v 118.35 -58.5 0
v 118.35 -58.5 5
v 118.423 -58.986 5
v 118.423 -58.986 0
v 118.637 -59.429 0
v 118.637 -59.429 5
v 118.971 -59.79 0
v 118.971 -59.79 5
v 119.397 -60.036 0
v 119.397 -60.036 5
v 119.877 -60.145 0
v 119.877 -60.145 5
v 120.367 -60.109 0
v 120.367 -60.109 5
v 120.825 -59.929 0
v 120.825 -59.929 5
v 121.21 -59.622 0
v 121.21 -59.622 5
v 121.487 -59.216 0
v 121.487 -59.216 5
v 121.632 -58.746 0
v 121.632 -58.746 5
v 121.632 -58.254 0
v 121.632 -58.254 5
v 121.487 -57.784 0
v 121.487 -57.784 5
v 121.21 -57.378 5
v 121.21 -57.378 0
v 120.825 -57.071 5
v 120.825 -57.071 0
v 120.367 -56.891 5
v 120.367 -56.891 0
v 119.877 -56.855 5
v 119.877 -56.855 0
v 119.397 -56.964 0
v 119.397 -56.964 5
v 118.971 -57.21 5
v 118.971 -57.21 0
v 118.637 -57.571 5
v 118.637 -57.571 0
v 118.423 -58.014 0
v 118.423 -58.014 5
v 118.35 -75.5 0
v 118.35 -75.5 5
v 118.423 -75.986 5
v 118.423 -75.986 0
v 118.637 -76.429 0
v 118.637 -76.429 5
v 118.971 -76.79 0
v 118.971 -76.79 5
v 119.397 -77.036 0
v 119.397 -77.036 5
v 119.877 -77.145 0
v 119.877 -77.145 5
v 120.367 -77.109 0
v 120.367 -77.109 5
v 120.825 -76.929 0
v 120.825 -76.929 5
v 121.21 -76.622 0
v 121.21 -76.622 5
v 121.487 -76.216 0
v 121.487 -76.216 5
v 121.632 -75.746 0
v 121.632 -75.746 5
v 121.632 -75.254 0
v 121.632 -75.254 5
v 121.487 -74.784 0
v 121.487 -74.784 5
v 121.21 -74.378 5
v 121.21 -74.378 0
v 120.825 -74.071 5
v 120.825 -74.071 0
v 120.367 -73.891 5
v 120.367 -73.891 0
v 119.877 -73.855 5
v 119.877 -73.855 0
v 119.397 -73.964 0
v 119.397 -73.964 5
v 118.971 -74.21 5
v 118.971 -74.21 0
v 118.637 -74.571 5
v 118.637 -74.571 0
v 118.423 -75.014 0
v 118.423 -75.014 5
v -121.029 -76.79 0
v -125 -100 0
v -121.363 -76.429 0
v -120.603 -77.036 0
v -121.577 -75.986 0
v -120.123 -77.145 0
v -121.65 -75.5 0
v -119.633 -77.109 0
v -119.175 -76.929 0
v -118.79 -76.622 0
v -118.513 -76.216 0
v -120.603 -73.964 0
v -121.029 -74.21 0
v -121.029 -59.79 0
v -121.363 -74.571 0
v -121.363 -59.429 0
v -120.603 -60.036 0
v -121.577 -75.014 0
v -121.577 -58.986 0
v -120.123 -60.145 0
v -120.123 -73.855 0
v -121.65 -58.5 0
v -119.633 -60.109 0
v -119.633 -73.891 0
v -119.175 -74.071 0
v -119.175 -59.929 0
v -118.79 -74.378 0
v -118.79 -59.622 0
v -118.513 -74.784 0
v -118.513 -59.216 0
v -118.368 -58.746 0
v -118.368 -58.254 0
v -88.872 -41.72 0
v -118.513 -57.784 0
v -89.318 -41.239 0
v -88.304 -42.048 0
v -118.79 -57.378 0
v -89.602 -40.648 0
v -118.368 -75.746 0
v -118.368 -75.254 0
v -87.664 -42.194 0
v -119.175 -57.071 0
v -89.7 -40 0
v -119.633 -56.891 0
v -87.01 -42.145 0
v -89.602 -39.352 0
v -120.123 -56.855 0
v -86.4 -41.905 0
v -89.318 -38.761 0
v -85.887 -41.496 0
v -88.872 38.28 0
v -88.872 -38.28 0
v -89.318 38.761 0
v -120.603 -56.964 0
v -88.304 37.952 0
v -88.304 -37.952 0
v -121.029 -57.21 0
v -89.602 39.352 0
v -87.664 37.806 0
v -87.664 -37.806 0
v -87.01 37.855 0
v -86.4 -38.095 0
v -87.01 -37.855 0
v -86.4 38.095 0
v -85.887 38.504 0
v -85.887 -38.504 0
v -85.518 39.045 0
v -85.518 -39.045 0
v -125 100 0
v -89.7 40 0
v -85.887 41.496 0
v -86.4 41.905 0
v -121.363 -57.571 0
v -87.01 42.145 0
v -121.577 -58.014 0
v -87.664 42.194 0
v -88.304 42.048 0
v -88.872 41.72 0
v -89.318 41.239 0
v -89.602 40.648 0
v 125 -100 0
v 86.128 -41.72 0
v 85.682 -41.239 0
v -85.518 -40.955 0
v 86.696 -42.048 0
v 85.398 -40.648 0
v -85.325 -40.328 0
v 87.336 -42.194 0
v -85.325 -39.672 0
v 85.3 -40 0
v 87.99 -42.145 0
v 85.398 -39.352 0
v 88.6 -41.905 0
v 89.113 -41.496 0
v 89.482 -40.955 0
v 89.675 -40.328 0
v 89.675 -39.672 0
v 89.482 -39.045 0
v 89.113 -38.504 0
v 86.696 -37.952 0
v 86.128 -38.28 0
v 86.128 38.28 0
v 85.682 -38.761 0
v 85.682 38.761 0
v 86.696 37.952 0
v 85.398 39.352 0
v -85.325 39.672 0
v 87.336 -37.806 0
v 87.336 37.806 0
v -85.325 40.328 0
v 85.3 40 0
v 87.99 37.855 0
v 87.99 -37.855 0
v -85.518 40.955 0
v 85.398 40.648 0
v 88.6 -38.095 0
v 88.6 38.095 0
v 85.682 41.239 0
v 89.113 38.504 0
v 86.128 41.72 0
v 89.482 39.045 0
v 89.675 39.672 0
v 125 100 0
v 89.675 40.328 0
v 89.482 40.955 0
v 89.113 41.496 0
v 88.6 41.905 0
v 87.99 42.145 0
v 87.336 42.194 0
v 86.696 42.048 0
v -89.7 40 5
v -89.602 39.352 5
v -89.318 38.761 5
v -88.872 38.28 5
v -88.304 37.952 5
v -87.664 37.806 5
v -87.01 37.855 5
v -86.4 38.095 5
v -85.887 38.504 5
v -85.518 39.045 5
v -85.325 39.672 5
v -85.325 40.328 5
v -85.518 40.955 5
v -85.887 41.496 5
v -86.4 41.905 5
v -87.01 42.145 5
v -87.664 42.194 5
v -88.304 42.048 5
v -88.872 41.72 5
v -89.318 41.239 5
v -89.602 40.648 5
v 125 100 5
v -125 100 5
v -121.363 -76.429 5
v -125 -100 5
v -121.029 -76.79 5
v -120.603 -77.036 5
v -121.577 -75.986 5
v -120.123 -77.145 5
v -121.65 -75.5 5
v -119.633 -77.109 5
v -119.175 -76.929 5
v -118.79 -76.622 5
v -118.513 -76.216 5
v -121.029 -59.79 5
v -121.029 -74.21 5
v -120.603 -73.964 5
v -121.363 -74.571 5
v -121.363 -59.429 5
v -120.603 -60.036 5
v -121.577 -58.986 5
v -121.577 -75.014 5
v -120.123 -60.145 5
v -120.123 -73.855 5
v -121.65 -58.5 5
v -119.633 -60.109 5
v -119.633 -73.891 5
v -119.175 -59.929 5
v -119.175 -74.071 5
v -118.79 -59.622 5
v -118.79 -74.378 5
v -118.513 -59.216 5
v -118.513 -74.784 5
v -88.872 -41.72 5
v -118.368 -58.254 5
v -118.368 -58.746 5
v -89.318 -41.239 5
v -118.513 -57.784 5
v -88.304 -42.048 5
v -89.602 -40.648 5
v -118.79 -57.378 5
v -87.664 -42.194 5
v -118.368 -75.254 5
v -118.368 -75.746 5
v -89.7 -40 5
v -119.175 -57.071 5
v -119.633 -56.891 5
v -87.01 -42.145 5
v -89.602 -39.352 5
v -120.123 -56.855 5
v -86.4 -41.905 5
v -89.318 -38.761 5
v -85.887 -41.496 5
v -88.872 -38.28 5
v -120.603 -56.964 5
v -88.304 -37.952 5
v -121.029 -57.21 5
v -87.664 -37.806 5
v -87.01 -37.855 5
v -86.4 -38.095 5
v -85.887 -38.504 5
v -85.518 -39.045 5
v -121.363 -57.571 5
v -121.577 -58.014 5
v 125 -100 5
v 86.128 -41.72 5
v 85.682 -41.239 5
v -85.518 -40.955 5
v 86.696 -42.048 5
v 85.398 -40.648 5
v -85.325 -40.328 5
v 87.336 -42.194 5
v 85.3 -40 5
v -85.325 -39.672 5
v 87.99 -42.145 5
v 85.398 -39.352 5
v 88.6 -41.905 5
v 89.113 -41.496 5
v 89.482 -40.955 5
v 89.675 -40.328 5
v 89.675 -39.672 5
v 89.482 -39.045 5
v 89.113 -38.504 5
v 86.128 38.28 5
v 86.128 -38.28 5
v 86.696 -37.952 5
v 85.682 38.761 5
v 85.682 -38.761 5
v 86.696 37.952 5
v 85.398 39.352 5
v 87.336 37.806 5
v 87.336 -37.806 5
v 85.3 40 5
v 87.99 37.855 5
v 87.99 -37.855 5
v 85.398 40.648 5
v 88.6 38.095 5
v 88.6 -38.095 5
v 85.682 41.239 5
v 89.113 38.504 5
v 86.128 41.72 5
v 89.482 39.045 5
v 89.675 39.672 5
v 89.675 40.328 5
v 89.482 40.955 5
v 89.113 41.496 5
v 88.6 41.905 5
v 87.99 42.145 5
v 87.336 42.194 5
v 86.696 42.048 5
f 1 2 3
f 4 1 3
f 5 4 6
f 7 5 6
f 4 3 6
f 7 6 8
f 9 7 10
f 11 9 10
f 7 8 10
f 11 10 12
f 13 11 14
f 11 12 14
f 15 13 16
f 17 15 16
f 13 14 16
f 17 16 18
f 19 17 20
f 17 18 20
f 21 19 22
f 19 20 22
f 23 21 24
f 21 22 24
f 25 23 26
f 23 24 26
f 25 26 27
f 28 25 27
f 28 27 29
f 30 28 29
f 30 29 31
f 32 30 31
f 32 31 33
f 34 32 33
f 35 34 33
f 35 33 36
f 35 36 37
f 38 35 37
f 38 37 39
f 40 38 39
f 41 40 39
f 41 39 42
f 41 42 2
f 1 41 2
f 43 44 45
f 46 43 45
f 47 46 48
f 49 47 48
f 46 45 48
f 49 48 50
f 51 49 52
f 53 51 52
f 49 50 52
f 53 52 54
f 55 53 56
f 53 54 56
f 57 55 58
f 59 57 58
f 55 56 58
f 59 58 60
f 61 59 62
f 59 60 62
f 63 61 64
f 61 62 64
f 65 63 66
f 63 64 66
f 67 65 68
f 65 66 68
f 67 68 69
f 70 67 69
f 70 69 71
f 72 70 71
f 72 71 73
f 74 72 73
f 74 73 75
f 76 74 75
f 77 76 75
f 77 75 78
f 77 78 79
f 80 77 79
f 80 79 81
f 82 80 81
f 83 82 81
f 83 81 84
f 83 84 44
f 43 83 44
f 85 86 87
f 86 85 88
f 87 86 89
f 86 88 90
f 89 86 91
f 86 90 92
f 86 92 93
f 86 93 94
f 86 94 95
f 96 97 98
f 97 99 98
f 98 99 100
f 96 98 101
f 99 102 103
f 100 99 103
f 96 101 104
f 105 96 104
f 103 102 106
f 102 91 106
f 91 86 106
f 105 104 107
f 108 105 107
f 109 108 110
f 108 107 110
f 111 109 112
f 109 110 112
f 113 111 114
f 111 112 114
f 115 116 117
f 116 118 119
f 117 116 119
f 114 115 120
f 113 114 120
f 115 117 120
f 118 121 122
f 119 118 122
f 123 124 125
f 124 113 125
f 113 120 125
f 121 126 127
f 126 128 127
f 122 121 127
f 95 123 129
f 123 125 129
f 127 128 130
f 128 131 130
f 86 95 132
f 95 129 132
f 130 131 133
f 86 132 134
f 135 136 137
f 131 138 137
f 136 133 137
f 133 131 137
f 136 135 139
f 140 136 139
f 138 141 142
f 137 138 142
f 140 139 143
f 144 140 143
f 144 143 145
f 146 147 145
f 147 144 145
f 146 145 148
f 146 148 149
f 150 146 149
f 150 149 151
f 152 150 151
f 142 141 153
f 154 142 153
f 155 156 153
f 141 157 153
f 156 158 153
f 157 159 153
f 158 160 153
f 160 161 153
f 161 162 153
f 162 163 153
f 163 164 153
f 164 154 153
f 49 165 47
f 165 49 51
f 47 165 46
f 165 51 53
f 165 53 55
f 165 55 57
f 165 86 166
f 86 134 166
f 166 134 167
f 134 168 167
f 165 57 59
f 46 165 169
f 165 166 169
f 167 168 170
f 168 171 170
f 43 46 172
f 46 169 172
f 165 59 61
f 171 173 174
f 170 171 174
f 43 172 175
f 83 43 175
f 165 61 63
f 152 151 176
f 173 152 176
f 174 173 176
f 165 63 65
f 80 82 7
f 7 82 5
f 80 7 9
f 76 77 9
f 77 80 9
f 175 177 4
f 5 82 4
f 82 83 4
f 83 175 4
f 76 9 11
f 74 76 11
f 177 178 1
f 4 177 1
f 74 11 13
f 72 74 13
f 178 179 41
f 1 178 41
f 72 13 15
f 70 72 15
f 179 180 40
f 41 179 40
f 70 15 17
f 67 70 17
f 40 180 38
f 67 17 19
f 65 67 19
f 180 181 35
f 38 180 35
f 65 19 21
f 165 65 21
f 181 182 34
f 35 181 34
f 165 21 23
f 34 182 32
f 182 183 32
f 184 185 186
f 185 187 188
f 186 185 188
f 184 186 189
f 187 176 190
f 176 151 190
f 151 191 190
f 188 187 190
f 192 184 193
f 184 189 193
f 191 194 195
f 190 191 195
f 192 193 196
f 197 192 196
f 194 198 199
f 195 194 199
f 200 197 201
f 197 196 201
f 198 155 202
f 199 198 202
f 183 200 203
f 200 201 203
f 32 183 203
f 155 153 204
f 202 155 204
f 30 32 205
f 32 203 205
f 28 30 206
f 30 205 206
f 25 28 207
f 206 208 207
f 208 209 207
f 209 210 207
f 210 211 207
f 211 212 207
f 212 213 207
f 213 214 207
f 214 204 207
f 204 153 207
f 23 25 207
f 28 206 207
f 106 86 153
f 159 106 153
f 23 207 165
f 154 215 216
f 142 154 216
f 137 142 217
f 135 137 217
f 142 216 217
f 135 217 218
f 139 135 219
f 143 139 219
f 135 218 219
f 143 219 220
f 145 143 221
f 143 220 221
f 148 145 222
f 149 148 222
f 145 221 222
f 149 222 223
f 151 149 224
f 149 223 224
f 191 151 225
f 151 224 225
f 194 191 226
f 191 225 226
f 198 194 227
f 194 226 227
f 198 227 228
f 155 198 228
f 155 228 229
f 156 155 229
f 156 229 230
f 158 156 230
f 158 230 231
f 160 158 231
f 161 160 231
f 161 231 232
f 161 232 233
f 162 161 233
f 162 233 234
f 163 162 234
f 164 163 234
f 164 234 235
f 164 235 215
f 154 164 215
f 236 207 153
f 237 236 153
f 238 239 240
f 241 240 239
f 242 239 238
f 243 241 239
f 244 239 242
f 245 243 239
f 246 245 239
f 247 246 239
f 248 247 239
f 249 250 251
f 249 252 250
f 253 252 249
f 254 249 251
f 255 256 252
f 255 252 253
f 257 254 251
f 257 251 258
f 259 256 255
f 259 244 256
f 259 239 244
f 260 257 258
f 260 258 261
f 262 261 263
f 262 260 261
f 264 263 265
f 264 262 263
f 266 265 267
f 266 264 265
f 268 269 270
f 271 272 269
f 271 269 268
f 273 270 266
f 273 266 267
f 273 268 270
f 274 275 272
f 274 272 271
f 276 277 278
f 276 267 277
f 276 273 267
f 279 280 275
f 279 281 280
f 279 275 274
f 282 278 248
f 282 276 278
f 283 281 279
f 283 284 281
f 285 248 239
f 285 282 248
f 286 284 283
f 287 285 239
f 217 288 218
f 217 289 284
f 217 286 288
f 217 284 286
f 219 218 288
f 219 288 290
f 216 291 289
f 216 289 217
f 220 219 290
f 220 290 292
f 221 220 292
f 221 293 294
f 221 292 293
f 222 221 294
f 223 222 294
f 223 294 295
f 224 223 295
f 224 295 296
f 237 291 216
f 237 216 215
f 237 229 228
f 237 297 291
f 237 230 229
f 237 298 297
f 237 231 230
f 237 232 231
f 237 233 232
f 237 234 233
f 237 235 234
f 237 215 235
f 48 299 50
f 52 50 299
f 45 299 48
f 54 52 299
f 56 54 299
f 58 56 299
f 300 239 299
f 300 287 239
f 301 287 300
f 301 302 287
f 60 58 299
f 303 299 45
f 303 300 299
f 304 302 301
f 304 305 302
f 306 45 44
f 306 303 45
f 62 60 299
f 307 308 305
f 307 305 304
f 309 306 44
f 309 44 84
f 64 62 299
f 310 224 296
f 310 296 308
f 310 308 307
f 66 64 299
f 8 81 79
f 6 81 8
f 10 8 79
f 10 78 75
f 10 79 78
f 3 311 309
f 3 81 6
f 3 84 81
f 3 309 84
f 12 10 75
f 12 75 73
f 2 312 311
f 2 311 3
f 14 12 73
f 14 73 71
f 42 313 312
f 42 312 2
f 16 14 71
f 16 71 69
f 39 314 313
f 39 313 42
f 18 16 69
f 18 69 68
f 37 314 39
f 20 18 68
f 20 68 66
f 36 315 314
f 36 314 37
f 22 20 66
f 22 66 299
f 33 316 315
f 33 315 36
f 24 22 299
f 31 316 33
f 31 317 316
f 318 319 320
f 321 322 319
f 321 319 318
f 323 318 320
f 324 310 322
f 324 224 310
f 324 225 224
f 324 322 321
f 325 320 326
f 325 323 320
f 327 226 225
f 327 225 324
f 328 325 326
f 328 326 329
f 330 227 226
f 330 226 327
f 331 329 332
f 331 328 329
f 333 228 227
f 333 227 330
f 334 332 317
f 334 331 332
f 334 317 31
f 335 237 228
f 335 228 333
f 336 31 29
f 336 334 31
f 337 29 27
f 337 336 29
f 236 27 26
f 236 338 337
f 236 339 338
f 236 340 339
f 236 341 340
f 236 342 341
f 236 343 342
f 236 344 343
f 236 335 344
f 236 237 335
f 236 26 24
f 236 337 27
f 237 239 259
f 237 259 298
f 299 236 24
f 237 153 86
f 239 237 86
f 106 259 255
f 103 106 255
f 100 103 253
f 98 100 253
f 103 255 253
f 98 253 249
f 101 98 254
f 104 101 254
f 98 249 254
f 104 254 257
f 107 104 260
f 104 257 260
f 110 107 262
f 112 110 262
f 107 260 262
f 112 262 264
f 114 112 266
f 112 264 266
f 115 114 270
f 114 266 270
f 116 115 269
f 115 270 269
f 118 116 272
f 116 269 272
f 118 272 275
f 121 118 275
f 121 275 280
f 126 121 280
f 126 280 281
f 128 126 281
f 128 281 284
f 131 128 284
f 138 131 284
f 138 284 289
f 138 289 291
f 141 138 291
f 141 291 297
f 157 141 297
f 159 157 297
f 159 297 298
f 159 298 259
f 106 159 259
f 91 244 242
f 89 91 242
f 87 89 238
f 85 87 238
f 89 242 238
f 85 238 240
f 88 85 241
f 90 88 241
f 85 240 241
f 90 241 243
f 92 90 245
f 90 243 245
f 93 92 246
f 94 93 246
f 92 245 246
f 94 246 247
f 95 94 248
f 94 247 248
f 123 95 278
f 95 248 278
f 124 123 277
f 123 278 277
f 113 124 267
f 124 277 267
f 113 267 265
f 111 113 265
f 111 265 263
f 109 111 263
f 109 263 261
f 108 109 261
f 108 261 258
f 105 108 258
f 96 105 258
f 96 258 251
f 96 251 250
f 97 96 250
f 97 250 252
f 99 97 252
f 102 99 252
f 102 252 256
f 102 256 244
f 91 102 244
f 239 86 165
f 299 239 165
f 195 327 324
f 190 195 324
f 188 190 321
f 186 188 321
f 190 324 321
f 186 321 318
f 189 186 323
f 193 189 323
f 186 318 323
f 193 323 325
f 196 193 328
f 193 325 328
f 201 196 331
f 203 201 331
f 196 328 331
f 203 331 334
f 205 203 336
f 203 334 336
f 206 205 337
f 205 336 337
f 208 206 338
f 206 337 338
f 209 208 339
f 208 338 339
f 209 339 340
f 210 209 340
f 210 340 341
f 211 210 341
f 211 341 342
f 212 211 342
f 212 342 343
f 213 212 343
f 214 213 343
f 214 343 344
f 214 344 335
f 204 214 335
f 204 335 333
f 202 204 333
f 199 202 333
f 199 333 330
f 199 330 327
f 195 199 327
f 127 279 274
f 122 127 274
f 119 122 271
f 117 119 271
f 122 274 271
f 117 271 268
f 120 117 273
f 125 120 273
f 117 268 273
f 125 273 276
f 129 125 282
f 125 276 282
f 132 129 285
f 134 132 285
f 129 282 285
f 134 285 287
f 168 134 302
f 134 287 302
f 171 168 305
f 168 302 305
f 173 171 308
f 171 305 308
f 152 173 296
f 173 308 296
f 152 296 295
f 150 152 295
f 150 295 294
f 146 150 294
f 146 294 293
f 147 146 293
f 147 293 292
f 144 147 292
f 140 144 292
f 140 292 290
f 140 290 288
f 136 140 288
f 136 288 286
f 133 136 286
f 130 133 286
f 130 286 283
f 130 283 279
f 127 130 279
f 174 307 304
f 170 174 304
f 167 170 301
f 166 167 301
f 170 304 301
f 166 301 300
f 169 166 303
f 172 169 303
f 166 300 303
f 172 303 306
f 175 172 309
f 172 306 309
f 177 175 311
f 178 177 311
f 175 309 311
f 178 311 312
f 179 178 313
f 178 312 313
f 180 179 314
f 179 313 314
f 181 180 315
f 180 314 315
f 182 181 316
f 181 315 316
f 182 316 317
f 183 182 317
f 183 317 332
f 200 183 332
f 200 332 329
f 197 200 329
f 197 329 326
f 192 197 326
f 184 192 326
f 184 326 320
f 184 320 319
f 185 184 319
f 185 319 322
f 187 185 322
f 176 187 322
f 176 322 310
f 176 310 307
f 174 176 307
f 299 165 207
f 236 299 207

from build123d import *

# Parameters (mm, degrees)
F1_DEPTH = 5
F2_D     = 4.4
F3_D     = 3.3


with BuildPart() as f1:
    # F0 (on Top) → F1 (new body)
    with BuildSketch(Plane.XY):
        Polygon((125, 100), (-125, 100), (-125, -54), (-125, -80), (-125, -100), (125, -100), align=None)
    extrude(amount=F1_DEPTH)

    # F2 (through all)
    with Locations(Plane(origin=(0, 0, 0), x_dir=(1, 0, 0), z_dir=(0, 0, -1))):
        with Locations((-87.5, -40), (87.5, -40), (-87.5, 40), (87.5, 40)):
            Hole(F2_D / 2)

    # F3 (through all)
    with Locations(Plane(origin=(0, 0, 0), x_dir=(1, 0, 0), z_dir=(0, 0, -1))):
        with Locations((-120, 58.5), (-120, 75.5), (120, 75.5), (120, 58.5)):
            Hole(F3_D / 2)


solid = f1.part
